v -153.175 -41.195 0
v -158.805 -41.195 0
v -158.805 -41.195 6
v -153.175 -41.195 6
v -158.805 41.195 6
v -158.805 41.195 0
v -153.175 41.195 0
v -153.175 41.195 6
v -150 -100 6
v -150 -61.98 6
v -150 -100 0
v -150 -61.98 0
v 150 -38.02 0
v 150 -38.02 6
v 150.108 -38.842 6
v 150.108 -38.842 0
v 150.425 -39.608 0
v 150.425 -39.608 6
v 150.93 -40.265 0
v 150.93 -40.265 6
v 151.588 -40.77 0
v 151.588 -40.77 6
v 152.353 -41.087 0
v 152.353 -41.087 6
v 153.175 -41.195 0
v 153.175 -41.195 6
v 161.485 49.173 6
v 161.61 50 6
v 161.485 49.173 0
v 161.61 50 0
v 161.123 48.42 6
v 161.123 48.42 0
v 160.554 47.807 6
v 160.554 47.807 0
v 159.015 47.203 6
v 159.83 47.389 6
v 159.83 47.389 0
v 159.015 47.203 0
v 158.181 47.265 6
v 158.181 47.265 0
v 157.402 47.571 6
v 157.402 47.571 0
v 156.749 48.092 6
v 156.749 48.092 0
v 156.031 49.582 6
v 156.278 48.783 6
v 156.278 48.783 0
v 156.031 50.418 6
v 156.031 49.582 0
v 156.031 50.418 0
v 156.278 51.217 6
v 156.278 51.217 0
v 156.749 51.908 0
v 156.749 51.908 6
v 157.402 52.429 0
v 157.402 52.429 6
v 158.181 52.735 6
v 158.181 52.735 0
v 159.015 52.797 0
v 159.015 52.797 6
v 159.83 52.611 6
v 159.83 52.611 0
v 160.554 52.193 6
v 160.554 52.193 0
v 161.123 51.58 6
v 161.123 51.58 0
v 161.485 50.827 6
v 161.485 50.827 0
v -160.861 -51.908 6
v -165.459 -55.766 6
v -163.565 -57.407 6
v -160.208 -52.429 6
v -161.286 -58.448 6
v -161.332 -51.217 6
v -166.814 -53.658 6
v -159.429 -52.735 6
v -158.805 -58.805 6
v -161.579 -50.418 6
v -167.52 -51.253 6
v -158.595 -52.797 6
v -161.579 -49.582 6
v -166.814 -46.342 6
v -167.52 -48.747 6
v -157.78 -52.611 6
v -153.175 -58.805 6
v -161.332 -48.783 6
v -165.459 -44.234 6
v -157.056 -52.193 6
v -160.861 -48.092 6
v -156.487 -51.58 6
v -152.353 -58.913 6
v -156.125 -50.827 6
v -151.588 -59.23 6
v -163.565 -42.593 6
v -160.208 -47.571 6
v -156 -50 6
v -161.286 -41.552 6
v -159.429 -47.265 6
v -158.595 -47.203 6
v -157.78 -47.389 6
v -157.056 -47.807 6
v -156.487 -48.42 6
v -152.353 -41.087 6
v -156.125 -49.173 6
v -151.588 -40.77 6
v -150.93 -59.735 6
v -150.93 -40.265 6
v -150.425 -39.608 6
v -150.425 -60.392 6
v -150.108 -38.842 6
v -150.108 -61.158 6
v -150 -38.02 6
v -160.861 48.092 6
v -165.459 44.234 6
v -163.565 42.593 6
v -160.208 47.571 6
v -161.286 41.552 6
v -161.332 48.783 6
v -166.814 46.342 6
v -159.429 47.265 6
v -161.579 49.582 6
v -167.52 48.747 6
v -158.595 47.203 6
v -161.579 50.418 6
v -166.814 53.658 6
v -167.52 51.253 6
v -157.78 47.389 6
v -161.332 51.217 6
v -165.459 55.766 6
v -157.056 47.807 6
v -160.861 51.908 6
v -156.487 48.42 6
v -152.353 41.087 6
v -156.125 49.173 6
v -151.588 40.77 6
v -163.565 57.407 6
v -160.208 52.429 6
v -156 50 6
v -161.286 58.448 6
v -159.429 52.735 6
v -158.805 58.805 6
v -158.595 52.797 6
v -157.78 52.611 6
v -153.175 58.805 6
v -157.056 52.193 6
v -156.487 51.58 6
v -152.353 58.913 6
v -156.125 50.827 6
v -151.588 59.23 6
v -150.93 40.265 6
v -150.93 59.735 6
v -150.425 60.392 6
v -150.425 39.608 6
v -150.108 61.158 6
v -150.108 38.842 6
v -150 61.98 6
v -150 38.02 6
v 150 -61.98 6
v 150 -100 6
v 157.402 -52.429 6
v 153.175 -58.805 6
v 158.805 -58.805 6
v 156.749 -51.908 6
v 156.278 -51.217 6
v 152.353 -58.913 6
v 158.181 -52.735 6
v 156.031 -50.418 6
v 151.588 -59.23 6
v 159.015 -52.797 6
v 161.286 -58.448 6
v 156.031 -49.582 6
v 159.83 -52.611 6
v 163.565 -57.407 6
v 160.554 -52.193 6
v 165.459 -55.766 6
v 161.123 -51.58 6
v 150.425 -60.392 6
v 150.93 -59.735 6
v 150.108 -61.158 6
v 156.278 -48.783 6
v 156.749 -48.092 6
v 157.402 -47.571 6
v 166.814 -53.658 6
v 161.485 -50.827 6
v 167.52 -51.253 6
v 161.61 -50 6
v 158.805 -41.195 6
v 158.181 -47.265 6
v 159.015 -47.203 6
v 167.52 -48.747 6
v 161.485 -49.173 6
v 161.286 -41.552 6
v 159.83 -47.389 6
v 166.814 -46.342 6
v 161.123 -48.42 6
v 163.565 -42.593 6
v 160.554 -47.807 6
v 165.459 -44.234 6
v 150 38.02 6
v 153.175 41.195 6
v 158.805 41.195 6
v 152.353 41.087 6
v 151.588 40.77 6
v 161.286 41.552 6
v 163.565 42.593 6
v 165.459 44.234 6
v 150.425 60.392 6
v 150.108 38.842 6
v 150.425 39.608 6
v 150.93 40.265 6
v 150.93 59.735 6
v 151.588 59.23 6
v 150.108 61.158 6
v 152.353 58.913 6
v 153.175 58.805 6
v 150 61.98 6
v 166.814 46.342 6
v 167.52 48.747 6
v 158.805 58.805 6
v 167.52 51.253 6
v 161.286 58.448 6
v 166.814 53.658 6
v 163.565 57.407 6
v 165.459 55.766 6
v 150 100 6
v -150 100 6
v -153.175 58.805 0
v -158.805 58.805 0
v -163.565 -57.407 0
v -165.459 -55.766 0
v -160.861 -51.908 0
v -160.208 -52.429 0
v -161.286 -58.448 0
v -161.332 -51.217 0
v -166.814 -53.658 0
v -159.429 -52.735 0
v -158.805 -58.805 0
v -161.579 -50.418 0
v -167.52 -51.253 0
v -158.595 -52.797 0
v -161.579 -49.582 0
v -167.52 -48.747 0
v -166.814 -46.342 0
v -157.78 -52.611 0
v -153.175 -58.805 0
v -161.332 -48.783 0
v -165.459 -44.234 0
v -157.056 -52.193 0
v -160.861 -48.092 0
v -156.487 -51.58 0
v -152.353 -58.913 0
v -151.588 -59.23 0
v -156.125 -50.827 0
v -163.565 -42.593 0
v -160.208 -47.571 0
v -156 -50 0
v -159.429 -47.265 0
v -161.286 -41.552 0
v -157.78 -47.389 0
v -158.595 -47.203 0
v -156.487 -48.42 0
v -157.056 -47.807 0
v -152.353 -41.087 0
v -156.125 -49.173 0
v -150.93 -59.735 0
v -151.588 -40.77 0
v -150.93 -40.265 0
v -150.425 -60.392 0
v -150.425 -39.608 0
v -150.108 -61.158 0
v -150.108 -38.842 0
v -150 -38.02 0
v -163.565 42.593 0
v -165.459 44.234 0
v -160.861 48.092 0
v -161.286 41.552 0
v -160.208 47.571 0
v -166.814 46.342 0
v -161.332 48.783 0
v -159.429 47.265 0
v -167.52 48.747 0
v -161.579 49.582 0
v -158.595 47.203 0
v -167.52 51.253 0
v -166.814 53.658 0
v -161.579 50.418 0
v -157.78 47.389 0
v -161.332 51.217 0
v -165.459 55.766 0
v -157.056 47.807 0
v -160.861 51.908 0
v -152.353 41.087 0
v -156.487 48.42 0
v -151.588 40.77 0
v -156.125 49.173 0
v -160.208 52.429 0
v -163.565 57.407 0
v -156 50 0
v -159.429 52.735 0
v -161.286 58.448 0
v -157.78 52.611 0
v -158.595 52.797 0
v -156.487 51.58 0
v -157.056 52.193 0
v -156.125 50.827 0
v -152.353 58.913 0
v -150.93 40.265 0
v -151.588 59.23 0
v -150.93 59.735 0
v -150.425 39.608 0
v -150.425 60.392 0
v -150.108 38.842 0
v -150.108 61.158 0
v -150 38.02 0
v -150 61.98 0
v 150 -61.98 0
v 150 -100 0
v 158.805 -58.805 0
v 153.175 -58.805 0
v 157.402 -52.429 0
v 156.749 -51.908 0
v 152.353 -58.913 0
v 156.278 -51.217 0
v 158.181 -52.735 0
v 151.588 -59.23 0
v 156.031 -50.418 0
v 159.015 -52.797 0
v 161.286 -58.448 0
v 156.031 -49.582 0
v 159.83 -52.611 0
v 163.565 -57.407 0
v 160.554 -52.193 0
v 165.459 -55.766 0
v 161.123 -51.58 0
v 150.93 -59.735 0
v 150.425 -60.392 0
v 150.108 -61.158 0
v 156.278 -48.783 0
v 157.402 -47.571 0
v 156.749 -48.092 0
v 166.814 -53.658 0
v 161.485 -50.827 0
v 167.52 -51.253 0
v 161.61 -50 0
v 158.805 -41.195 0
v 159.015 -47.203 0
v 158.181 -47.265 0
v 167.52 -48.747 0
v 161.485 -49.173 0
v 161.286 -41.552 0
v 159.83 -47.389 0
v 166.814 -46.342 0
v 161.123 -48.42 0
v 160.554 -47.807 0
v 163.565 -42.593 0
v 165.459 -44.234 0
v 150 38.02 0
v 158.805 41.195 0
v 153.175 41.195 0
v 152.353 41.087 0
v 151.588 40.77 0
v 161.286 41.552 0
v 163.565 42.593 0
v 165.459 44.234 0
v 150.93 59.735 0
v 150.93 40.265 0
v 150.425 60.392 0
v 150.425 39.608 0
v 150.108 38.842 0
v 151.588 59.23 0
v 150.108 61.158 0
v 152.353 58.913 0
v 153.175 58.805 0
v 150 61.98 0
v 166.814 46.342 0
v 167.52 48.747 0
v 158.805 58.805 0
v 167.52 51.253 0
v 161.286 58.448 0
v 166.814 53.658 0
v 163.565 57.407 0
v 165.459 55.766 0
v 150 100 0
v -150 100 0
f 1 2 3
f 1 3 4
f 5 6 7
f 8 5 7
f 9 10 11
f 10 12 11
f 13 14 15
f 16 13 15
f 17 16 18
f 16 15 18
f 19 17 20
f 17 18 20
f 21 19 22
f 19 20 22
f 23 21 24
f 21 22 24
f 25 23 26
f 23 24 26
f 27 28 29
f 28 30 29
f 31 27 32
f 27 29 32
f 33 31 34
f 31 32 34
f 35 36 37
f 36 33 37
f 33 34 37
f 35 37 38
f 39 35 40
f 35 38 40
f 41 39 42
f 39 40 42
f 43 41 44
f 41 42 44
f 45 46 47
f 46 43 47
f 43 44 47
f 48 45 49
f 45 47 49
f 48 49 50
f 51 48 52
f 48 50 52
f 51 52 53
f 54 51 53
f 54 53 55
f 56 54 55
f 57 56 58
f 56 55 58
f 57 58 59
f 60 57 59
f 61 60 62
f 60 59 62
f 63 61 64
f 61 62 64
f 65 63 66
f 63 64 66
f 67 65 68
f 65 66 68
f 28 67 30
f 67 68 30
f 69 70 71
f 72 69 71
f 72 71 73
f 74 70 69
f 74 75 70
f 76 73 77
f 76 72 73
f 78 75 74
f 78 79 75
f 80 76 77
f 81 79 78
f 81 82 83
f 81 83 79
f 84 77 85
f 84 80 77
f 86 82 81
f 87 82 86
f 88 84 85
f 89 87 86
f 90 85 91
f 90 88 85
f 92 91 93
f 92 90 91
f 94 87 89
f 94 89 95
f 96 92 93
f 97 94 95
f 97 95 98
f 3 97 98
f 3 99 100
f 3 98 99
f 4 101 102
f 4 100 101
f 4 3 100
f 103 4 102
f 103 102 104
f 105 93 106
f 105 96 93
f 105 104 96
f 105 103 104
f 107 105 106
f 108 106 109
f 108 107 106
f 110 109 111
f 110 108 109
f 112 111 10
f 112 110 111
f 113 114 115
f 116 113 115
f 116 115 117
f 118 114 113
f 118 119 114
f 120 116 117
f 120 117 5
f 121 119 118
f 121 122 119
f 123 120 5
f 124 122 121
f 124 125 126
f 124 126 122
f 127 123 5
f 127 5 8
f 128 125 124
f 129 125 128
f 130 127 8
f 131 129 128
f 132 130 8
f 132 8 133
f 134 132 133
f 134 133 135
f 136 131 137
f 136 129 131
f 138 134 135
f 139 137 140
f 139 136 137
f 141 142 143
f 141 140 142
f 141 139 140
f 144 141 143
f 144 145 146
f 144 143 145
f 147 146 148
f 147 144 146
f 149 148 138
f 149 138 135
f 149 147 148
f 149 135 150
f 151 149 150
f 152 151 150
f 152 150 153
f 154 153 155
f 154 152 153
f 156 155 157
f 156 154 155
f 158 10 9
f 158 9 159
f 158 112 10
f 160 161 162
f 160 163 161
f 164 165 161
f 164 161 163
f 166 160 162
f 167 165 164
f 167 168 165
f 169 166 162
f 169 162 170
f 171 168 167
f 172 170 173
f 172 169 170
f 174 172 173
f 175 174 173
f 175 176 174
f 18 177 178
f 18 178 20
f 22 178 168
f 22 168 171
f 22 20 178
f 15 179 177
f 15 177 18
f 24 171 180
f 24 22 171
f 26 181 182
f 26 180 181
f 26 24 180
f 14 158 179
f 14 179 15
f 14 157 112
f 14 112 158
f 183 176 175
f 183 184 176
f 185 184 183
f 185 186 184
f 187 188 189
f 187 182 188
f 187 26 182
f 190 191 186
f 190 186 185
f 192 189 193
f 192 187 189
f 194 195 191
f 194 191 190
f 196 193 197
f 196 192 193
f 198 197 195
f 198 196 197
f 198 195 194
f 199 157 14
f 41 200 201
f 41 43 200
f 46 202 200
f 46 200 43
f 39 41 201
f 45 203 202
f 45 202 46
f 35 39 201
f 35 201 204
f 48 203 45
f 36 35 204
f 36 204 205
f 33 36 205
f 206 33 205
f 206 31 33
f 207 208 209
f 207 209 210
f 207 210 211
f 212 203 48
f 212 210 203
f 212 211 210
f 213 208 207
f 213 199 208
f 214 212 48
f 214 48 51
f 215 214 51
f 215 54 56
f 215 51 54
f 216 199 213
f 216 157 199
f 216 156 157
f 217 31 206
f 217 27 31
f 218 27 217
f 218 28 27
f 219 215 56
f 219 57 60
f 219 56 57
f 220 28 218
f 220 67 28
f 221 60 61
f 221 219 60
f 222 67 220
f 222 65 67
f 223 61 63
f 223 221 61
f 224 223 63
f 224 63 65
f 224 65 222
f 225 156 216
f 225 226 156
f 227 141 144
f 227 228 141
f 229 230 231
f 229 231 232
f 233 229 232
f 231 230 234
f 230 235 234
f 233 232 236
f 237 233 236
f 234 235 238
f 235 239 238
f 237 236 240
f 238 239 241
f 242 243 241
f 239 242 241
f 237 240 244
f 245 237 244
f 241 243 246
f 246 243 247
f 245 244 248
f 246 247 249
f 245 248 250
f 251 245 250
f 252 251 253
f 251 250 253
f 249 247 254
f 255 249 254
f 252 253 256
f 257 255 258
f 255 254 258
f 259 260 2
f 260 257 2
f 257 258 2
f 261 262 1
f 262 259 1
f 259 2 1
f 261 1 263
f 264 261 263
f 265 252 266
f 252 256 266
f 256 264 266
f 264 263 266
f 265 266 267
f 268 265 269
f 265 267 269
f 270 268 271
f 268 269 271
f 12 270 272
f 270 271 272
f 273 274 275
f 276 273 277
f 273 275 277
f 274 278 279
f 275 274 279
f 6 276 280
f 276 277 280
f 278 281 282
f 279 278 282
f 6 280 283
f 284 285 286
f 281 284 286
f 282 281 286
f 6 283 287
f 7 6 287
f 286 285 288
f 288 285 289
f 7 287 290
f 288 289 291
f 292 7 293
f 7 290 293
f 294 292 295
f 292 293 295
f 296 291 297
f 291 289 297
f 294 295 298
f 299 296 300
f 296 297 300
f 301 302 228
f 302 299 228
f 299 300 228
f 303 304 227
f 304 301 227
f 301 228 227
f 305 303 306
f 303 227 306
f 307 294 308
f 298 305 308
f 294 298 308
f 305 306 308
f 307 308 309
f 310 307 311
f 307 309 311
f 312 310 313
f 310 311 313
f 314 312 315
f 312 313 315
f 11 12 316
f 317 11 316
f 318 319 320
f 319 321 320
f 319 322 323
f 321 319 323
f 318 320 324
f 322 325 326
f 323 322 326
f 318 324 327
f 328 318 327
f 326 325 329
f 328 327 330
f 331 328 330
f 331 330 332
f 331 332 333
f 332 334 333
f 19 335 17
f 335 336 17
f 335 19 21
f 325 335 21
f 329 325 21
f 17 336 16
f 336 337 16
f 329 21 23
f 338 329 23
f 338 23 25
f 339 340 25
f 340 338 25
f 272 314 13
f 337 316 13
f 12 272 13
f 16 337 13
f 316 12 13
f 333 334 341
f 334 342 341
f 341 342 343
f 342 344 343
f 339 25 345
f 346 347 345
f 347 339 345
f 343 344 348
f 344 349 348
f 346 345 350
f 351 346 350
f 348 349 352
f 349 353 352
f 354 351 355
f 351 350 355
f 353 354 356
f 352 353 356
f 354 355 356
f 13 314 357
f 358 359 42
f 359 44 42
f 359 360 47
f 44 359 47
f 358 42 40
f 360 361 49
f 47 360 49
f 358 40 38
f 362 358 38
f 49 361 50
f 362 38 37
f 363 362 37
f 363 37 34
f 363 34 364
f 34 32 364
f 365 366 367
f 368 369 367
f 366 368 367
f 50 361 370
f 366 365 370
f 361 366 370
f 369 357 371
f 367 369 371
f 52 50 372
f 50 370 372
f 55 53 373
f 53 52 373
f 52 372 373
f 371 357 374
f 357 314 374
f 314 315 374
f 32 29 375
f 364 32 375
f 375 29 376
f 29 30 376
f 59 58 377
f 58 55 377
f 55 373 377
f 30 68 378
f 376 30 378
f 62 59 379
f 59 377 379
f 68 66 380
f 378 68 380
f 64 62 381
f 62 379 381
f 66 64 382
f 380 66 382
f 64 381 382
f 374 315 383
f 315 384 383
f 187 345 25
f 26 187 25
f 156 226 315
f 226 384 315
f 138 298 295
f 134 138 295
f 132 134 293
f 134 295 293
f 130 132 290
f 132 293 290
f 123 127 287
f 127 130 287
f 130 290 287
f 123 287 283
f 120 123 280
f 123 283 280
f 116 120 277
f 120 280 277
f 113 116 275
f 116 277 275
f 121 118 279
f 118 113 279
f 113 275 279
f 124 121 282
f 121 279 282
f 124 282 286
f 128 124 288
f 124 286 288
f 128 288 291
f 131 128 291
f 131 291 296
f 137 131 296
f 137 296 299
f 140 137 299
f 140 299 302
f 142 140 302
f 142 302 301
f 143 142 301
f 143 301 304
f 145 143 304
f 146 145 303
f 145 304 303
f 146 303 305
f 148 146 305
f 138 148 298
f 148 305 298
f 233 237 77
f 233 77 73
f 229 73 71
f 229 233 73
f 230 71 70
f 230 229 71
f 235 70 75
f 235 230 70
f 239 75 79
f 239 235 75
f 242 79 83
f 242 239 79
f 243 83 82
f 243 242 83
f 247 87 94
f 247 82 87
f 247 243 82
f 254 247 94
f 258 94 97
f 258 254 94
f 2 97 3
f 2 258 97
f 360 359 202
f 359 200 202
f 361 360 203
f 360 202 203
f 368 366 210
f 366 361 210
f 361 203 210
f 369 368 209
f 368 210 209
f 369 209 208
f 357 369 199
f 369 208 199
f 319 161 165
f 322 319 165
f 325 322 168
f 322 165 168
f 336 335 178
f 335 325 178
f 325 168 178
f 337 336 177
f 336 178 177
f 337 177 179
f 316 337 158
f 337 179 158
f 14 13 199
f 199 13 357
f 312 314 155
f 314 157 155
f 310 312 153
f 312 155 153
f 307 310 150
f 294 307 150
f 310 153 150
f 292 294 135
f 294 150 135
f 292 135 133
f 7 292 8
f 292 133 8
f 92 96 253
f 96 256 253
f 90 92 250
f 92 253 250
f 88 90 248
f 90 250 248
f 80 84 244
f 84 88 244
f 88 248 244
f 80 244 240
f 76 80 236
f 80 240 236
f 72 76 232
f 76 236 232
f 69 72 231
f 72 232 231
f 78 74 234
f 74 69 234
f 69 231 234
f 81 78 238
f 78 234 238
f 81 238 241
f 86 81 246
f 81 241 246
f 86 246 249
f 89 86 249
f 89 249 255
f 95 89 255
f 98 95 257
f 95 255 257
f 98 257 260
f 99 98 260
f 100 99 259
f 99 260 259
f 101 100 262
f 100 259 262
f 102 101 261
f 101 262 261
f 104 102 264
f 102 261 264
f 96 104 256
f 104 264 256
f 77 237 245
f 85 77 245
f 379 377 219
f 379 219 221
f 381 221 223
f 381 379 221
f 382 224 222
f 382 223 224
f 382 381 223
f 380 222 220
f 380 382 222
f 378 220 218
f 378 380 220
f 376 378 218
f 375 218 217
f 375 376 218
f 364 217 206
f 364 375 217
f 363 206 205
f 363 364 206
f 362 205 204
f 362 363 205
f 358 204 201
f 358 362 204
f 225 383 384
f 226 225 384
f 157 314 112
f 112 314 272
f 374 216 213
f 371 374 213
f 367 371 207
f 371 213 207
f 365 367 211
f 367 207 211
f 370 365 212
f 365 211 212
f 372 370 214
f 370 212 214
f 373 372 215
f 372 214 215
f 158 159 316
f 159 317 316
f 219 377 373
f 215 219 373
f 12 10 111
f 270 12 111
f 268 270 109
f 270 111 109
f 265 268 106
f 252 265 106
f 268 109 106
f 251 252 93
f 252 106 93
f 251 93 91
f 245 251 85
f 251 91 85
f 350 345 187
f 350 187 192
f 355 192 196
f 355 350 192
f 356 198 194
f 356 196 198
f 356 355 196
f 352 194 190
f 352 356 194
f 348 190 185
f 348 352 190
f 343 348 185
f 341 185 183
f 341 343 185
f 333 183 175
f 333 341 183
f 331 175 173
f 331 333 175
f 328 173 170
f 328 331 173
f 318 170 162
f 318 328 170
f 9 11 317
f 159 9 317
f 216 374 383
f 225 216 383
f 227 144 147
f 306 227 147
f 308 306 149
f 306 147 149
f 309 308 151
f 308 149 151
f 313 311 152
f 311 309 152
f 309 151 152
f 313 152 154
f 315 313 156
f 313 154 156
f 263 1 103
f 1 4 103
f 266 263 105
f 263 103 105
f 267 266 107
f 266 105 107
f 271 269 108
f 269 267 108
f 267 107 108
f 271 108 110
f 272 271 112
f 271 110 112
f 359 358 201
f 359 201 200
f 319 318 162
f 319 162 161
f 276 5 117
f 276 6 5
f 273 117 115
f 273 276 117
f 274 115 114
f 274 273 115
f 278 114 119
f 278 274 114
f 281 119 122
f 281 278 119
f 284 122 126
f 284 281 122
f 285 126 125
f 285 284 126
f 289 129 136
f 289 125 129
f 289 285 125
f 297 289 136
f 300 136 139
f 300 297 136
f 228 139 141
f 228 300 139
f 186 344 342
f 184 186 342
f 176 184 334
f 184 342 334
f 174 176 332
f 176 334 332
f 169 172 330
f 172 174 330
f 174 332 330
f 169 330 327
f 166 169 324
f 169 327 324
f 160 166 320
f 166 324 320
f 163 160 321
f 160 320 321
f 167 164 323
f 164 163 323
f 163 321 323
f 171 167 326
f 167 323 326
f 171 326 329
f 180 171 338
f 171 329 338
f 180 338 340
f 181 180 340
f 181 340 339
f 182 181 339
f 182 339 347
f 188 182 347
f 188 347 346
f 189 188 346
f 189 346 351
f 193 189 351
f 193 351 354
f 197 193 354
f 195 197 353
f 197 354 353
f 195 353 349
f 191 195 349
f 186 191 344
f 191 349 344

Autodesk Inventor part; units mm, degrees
ref_plane "YZ Plane" through (0, 0, 0) normal (1, 0, 0) x (0, 1, 0)
ref_plane "XZ Plane" through (0, 0, 0) normal (0, 1, 0) x (-1, 0, 0)
ref_plane "XY Plane" through (0, 0, 0) normal (0, 0, 1) x (1, 0, 0)
sketch "Sketch1" plane through (0, 0, 0) normal (0, 0, 1) x (1, 0, 0)
  line L0 (150, -100) -> (150, 100)
  line L1 (-150, -100) -> (150, -100)
  line L2 (150, 100) -> (-150, 100)
  line L3 (-150, 100) -> (-150, -100)
  line L4 (0, 100) -> (0, 0) construction
  line L5 (0, 0) -> (0, -100) construction
  line L6 (0, -50) -> (150, -50) construction
  line L7 (0, 50) -> (150, 50) construction
  line L8 (0, 50) -> (-150, 50) construction
  line L9 (0, -50) -> (-150, -50) construction
  line L10 (-150, -50) -> (-158.805, -50) construction
  circle A0 centre (-158.805, -50) radius 8.805
  circle A1 centre (-158.805, -50) radius 2.805
  circle A2 centre (-158.805, 50) radius 2.805
  circle A3 centre (-158.805, 50) radius 8.805
  line L11 (150, -50) -> (158.805, -50) construction
  circle A4 centre (158.805, -50) radius 8.805
  circle A5 centre (158.805, -50) radius 2.805
  circle A6 centre (158.805, 50) radius 8.805
  circle A7 centre (158.805, 50) radius 2.805
  line L12 (158.805, 41.195) -> (150, 41.195)
  line L13 (158.805, 58.805) -> (150, 58.805)
  line L14 (158.805, -41.195) -> (150, -41.195)
  line L15 (158.805, -58.805) -> (150, -58.805)
  line L16 (-158.805, -58.805) -> (-150, -58.805)
  line L17 (-158.805, -41.195) -> (-150, -41.195)
  line L18 (-158.805, 41.195) -> (-150, 41.195)
  line L19 (-158.805, 58.805) -> (-150, 58.805)
  dimension "d0" = 8.805
  dimension "d1" = 5.61
  dimension "d2" = 5.61
  dimension "d3" = 8.805
  dimension "d4" = 5.61
extrude "Plate1" add sketch "Sketch1" along normal blind 6
fillet "Corner Round1" radius 3.175 8 edges at (-150, -58.805, 3) (-150, -41.195, 3) (-150, 41.195, 3) (-150, 58.805, 3) (150, 58.805, 3) (150, 41.195, 3) (150, -41.195, 3) (150, -58.805, 3)
equation "\"d7\" = Thickness"
equation "\"BendRadius\" = Thickness"
equation "\"BendReliefWidth\" = Thickness"
equation "\"BendReliefDepth\" = 0.5 * Thickness"
equation "\"CornerReliefSize\" = 4 * Thickness"
equation "\"MinimumRemnant\" = 2 * Thickness"
equation "\"TransitionRadius\" = BendRadius"
equation "\"JacobiRadiusSize\" = BendRadius"
equation "\"GapSize\" = Thickness"
equation "\"Thickness\" = 6"
properties part number "bed-plate"
